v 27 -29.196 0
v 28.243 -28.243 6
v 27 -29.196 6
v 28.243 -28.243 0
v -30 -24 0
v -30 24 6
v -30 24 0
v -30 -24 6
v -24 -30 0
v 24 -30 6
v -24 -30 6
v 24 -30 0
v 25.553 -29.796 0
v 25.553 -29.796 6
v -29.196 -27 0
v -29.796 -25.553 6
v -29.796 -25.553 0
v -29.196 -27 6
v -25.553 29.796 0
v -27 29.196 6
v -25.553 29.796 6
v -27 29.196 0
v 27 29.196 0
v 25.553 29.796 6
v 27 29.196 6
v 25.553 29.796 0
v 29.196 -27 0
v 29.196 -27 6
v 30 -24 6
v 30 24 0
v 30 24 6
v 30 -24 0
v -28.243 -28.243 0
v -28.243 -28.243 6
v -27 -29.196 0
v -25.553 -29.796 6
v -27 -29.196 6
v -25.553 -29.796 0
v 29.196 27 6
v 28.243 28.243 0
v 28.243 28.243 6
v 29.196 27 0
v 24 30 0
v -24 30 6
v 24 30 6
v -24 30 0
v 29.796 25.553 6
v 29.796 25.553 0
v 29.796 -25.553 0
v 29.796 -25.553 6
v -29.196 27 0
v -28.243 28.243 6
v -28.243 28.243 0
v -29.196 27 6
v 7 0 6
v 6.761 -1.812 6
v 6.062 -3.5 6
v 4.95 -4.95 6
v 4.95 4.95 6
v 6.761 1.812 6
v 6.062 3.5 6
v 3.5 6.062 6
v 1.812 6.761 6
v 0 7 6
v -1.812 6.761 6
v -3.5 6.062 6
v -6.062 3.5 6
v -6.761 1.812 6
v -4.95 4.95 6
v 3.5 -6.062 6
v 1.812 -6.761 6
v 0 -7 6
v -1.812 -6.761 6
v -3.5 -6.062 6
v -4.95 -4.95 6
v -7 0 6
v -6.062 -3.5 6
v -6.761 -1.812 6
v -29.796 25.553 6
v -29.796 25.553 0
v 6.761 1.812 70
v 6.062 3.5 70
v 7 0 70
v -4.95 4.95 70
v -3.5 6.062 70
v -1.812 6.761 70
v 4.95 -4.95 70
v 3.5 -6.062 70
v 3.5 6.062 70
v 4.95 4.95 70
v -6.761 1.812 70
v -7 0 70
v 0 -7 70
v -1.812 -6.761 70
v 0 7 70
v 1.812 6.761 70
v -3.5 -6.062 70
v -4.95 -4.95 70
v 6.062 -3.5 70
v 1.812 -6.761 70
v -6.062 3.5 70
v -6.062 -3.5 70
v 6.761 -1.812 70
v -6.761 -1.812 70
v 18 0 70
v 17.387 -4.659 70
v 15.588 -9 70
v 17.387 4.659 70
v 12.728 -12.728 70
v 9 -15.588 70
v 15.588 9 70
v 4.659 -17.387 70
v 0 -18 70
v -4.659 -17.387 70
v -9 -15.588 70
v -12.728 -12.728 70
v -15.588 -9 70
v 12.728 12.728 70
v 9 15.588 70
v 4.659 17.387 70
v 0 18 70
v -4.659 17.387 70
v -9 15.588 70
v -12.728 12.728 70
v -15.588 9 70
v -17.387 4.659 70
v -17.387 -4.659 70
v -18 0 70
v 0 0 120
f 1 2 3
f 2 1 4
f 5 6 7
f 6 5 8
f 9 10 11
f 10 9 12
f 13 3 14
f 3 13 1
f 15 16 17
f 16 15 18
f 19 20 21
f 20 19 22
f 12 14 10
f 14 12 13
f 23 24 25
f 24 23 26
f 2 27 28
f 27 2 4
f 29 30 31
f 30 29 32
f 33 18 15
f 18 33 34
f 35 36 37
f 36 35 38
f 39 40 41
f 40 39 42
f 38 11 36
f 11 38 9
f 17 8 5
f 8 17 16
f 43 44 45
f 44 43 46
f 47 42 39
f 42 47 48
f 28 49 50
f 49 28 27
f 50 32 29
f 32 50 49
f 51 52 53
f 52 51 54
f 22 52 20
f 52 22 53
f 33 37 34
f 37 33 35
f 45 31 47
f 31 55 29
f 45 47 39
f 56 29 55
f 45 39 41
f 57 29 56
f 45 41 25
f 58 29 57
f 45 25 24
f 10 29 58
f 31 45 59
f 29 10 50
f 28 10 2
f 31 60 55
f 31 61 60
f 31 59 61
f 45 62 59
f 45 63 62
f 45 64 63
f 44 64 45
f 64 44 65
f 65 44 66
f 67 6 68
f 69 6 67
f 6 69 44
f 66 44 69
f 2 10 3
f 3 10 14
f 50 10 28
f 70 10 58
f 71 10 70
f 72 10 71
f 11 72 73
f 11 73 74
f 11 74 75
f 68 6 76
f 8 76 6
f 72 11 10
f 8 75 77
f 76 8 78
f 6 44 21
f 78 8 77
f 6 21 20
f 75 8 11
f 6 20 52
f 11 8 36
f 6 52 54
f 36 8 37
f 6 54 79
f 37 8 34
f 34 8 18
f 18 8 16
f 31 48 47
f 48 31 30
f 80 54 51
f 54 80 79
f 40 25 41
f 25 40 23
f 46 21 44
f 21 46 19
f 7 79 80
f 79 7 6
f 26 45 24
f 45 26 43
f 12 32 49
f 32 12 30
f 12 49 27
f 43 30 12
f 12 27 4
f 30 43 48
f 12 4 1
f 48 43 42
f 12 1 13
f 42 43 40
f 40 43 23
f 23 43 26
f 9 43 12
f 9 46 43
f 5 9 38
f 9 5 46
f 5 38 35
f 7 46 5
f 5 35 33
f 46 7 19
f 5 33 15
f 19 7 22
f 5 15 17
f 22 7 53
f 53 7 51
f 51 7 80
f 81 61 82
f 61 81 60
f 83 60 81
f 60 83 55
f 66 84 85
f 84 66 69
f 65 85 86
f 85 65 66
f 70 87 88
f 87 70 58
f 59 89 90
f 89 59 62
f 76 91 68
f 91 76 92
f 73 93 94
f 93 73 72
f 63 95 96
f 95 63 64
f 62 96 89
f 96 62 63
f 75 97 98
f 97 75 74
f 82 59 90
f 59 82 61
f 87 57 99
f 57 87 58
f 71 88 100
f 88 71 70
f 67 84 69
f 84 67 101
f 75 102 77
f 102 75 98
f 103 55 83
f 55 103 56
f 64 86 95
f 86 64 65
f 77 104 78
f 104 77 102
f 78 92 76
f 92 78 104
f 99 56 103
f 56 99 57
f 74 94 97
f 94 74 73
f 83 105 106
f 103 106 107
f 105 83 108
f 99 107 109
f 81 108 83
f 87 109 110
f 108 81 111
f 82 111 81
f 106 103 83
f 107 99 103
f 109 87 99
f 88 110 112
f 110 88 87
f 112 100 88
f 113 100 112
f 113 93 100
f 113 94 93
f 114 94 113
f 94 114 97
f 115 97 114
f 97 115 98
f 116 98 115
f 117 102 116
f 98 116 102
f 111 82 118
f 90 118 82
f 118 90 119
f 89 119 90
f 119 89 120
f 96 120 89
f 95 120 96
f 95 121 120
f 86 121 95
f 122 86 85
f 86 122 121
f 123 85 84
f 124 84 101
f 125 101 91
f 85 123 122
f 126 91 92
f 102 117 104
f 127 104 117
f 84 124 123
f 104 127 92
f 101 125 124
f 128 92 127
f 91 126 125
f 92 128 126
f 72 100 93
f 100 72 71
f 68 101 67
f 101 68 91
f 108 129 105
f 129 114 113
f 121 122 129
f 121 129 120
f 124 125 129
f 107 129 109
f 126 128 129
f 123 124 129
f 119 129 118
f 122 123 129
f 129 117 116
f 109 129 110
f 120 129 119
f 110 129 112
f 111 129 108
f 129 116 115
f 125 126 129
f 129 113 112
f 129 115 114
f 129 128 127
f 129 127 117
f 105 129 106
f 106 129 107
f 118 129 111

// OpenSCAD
// Dimensions in millimetres; +Z is the ejection direction.
foot_size=60; corner_radius=6; foot_thickness=6;
shaft_diameter=14; shaft_top=70; head_diameter=36; height=120;
$fn=24;
module foot() { linear_extrude(height=foot_thickness) offset(r=corner_radius) square([foot_size-2*corner_radius,foot_size-2*corner_radius],center=true); }
module shaft() { translate([0,0,foot_thickness]) cylinder(d=shaft_diameter,h=shaft_top-foot_thickness); }
module head() { translate([0,0,shaft_top]) cylinder(d1=head_diameter,d2=0,h=height-shaft_top); }
module arrow() { union() { foot(); shaft(); head(); } }
if (is_undef(colored) || !colored) arrow();
else { color("#8E9296") { foot(); shaft(); } color("#DC9E33") head(); }
